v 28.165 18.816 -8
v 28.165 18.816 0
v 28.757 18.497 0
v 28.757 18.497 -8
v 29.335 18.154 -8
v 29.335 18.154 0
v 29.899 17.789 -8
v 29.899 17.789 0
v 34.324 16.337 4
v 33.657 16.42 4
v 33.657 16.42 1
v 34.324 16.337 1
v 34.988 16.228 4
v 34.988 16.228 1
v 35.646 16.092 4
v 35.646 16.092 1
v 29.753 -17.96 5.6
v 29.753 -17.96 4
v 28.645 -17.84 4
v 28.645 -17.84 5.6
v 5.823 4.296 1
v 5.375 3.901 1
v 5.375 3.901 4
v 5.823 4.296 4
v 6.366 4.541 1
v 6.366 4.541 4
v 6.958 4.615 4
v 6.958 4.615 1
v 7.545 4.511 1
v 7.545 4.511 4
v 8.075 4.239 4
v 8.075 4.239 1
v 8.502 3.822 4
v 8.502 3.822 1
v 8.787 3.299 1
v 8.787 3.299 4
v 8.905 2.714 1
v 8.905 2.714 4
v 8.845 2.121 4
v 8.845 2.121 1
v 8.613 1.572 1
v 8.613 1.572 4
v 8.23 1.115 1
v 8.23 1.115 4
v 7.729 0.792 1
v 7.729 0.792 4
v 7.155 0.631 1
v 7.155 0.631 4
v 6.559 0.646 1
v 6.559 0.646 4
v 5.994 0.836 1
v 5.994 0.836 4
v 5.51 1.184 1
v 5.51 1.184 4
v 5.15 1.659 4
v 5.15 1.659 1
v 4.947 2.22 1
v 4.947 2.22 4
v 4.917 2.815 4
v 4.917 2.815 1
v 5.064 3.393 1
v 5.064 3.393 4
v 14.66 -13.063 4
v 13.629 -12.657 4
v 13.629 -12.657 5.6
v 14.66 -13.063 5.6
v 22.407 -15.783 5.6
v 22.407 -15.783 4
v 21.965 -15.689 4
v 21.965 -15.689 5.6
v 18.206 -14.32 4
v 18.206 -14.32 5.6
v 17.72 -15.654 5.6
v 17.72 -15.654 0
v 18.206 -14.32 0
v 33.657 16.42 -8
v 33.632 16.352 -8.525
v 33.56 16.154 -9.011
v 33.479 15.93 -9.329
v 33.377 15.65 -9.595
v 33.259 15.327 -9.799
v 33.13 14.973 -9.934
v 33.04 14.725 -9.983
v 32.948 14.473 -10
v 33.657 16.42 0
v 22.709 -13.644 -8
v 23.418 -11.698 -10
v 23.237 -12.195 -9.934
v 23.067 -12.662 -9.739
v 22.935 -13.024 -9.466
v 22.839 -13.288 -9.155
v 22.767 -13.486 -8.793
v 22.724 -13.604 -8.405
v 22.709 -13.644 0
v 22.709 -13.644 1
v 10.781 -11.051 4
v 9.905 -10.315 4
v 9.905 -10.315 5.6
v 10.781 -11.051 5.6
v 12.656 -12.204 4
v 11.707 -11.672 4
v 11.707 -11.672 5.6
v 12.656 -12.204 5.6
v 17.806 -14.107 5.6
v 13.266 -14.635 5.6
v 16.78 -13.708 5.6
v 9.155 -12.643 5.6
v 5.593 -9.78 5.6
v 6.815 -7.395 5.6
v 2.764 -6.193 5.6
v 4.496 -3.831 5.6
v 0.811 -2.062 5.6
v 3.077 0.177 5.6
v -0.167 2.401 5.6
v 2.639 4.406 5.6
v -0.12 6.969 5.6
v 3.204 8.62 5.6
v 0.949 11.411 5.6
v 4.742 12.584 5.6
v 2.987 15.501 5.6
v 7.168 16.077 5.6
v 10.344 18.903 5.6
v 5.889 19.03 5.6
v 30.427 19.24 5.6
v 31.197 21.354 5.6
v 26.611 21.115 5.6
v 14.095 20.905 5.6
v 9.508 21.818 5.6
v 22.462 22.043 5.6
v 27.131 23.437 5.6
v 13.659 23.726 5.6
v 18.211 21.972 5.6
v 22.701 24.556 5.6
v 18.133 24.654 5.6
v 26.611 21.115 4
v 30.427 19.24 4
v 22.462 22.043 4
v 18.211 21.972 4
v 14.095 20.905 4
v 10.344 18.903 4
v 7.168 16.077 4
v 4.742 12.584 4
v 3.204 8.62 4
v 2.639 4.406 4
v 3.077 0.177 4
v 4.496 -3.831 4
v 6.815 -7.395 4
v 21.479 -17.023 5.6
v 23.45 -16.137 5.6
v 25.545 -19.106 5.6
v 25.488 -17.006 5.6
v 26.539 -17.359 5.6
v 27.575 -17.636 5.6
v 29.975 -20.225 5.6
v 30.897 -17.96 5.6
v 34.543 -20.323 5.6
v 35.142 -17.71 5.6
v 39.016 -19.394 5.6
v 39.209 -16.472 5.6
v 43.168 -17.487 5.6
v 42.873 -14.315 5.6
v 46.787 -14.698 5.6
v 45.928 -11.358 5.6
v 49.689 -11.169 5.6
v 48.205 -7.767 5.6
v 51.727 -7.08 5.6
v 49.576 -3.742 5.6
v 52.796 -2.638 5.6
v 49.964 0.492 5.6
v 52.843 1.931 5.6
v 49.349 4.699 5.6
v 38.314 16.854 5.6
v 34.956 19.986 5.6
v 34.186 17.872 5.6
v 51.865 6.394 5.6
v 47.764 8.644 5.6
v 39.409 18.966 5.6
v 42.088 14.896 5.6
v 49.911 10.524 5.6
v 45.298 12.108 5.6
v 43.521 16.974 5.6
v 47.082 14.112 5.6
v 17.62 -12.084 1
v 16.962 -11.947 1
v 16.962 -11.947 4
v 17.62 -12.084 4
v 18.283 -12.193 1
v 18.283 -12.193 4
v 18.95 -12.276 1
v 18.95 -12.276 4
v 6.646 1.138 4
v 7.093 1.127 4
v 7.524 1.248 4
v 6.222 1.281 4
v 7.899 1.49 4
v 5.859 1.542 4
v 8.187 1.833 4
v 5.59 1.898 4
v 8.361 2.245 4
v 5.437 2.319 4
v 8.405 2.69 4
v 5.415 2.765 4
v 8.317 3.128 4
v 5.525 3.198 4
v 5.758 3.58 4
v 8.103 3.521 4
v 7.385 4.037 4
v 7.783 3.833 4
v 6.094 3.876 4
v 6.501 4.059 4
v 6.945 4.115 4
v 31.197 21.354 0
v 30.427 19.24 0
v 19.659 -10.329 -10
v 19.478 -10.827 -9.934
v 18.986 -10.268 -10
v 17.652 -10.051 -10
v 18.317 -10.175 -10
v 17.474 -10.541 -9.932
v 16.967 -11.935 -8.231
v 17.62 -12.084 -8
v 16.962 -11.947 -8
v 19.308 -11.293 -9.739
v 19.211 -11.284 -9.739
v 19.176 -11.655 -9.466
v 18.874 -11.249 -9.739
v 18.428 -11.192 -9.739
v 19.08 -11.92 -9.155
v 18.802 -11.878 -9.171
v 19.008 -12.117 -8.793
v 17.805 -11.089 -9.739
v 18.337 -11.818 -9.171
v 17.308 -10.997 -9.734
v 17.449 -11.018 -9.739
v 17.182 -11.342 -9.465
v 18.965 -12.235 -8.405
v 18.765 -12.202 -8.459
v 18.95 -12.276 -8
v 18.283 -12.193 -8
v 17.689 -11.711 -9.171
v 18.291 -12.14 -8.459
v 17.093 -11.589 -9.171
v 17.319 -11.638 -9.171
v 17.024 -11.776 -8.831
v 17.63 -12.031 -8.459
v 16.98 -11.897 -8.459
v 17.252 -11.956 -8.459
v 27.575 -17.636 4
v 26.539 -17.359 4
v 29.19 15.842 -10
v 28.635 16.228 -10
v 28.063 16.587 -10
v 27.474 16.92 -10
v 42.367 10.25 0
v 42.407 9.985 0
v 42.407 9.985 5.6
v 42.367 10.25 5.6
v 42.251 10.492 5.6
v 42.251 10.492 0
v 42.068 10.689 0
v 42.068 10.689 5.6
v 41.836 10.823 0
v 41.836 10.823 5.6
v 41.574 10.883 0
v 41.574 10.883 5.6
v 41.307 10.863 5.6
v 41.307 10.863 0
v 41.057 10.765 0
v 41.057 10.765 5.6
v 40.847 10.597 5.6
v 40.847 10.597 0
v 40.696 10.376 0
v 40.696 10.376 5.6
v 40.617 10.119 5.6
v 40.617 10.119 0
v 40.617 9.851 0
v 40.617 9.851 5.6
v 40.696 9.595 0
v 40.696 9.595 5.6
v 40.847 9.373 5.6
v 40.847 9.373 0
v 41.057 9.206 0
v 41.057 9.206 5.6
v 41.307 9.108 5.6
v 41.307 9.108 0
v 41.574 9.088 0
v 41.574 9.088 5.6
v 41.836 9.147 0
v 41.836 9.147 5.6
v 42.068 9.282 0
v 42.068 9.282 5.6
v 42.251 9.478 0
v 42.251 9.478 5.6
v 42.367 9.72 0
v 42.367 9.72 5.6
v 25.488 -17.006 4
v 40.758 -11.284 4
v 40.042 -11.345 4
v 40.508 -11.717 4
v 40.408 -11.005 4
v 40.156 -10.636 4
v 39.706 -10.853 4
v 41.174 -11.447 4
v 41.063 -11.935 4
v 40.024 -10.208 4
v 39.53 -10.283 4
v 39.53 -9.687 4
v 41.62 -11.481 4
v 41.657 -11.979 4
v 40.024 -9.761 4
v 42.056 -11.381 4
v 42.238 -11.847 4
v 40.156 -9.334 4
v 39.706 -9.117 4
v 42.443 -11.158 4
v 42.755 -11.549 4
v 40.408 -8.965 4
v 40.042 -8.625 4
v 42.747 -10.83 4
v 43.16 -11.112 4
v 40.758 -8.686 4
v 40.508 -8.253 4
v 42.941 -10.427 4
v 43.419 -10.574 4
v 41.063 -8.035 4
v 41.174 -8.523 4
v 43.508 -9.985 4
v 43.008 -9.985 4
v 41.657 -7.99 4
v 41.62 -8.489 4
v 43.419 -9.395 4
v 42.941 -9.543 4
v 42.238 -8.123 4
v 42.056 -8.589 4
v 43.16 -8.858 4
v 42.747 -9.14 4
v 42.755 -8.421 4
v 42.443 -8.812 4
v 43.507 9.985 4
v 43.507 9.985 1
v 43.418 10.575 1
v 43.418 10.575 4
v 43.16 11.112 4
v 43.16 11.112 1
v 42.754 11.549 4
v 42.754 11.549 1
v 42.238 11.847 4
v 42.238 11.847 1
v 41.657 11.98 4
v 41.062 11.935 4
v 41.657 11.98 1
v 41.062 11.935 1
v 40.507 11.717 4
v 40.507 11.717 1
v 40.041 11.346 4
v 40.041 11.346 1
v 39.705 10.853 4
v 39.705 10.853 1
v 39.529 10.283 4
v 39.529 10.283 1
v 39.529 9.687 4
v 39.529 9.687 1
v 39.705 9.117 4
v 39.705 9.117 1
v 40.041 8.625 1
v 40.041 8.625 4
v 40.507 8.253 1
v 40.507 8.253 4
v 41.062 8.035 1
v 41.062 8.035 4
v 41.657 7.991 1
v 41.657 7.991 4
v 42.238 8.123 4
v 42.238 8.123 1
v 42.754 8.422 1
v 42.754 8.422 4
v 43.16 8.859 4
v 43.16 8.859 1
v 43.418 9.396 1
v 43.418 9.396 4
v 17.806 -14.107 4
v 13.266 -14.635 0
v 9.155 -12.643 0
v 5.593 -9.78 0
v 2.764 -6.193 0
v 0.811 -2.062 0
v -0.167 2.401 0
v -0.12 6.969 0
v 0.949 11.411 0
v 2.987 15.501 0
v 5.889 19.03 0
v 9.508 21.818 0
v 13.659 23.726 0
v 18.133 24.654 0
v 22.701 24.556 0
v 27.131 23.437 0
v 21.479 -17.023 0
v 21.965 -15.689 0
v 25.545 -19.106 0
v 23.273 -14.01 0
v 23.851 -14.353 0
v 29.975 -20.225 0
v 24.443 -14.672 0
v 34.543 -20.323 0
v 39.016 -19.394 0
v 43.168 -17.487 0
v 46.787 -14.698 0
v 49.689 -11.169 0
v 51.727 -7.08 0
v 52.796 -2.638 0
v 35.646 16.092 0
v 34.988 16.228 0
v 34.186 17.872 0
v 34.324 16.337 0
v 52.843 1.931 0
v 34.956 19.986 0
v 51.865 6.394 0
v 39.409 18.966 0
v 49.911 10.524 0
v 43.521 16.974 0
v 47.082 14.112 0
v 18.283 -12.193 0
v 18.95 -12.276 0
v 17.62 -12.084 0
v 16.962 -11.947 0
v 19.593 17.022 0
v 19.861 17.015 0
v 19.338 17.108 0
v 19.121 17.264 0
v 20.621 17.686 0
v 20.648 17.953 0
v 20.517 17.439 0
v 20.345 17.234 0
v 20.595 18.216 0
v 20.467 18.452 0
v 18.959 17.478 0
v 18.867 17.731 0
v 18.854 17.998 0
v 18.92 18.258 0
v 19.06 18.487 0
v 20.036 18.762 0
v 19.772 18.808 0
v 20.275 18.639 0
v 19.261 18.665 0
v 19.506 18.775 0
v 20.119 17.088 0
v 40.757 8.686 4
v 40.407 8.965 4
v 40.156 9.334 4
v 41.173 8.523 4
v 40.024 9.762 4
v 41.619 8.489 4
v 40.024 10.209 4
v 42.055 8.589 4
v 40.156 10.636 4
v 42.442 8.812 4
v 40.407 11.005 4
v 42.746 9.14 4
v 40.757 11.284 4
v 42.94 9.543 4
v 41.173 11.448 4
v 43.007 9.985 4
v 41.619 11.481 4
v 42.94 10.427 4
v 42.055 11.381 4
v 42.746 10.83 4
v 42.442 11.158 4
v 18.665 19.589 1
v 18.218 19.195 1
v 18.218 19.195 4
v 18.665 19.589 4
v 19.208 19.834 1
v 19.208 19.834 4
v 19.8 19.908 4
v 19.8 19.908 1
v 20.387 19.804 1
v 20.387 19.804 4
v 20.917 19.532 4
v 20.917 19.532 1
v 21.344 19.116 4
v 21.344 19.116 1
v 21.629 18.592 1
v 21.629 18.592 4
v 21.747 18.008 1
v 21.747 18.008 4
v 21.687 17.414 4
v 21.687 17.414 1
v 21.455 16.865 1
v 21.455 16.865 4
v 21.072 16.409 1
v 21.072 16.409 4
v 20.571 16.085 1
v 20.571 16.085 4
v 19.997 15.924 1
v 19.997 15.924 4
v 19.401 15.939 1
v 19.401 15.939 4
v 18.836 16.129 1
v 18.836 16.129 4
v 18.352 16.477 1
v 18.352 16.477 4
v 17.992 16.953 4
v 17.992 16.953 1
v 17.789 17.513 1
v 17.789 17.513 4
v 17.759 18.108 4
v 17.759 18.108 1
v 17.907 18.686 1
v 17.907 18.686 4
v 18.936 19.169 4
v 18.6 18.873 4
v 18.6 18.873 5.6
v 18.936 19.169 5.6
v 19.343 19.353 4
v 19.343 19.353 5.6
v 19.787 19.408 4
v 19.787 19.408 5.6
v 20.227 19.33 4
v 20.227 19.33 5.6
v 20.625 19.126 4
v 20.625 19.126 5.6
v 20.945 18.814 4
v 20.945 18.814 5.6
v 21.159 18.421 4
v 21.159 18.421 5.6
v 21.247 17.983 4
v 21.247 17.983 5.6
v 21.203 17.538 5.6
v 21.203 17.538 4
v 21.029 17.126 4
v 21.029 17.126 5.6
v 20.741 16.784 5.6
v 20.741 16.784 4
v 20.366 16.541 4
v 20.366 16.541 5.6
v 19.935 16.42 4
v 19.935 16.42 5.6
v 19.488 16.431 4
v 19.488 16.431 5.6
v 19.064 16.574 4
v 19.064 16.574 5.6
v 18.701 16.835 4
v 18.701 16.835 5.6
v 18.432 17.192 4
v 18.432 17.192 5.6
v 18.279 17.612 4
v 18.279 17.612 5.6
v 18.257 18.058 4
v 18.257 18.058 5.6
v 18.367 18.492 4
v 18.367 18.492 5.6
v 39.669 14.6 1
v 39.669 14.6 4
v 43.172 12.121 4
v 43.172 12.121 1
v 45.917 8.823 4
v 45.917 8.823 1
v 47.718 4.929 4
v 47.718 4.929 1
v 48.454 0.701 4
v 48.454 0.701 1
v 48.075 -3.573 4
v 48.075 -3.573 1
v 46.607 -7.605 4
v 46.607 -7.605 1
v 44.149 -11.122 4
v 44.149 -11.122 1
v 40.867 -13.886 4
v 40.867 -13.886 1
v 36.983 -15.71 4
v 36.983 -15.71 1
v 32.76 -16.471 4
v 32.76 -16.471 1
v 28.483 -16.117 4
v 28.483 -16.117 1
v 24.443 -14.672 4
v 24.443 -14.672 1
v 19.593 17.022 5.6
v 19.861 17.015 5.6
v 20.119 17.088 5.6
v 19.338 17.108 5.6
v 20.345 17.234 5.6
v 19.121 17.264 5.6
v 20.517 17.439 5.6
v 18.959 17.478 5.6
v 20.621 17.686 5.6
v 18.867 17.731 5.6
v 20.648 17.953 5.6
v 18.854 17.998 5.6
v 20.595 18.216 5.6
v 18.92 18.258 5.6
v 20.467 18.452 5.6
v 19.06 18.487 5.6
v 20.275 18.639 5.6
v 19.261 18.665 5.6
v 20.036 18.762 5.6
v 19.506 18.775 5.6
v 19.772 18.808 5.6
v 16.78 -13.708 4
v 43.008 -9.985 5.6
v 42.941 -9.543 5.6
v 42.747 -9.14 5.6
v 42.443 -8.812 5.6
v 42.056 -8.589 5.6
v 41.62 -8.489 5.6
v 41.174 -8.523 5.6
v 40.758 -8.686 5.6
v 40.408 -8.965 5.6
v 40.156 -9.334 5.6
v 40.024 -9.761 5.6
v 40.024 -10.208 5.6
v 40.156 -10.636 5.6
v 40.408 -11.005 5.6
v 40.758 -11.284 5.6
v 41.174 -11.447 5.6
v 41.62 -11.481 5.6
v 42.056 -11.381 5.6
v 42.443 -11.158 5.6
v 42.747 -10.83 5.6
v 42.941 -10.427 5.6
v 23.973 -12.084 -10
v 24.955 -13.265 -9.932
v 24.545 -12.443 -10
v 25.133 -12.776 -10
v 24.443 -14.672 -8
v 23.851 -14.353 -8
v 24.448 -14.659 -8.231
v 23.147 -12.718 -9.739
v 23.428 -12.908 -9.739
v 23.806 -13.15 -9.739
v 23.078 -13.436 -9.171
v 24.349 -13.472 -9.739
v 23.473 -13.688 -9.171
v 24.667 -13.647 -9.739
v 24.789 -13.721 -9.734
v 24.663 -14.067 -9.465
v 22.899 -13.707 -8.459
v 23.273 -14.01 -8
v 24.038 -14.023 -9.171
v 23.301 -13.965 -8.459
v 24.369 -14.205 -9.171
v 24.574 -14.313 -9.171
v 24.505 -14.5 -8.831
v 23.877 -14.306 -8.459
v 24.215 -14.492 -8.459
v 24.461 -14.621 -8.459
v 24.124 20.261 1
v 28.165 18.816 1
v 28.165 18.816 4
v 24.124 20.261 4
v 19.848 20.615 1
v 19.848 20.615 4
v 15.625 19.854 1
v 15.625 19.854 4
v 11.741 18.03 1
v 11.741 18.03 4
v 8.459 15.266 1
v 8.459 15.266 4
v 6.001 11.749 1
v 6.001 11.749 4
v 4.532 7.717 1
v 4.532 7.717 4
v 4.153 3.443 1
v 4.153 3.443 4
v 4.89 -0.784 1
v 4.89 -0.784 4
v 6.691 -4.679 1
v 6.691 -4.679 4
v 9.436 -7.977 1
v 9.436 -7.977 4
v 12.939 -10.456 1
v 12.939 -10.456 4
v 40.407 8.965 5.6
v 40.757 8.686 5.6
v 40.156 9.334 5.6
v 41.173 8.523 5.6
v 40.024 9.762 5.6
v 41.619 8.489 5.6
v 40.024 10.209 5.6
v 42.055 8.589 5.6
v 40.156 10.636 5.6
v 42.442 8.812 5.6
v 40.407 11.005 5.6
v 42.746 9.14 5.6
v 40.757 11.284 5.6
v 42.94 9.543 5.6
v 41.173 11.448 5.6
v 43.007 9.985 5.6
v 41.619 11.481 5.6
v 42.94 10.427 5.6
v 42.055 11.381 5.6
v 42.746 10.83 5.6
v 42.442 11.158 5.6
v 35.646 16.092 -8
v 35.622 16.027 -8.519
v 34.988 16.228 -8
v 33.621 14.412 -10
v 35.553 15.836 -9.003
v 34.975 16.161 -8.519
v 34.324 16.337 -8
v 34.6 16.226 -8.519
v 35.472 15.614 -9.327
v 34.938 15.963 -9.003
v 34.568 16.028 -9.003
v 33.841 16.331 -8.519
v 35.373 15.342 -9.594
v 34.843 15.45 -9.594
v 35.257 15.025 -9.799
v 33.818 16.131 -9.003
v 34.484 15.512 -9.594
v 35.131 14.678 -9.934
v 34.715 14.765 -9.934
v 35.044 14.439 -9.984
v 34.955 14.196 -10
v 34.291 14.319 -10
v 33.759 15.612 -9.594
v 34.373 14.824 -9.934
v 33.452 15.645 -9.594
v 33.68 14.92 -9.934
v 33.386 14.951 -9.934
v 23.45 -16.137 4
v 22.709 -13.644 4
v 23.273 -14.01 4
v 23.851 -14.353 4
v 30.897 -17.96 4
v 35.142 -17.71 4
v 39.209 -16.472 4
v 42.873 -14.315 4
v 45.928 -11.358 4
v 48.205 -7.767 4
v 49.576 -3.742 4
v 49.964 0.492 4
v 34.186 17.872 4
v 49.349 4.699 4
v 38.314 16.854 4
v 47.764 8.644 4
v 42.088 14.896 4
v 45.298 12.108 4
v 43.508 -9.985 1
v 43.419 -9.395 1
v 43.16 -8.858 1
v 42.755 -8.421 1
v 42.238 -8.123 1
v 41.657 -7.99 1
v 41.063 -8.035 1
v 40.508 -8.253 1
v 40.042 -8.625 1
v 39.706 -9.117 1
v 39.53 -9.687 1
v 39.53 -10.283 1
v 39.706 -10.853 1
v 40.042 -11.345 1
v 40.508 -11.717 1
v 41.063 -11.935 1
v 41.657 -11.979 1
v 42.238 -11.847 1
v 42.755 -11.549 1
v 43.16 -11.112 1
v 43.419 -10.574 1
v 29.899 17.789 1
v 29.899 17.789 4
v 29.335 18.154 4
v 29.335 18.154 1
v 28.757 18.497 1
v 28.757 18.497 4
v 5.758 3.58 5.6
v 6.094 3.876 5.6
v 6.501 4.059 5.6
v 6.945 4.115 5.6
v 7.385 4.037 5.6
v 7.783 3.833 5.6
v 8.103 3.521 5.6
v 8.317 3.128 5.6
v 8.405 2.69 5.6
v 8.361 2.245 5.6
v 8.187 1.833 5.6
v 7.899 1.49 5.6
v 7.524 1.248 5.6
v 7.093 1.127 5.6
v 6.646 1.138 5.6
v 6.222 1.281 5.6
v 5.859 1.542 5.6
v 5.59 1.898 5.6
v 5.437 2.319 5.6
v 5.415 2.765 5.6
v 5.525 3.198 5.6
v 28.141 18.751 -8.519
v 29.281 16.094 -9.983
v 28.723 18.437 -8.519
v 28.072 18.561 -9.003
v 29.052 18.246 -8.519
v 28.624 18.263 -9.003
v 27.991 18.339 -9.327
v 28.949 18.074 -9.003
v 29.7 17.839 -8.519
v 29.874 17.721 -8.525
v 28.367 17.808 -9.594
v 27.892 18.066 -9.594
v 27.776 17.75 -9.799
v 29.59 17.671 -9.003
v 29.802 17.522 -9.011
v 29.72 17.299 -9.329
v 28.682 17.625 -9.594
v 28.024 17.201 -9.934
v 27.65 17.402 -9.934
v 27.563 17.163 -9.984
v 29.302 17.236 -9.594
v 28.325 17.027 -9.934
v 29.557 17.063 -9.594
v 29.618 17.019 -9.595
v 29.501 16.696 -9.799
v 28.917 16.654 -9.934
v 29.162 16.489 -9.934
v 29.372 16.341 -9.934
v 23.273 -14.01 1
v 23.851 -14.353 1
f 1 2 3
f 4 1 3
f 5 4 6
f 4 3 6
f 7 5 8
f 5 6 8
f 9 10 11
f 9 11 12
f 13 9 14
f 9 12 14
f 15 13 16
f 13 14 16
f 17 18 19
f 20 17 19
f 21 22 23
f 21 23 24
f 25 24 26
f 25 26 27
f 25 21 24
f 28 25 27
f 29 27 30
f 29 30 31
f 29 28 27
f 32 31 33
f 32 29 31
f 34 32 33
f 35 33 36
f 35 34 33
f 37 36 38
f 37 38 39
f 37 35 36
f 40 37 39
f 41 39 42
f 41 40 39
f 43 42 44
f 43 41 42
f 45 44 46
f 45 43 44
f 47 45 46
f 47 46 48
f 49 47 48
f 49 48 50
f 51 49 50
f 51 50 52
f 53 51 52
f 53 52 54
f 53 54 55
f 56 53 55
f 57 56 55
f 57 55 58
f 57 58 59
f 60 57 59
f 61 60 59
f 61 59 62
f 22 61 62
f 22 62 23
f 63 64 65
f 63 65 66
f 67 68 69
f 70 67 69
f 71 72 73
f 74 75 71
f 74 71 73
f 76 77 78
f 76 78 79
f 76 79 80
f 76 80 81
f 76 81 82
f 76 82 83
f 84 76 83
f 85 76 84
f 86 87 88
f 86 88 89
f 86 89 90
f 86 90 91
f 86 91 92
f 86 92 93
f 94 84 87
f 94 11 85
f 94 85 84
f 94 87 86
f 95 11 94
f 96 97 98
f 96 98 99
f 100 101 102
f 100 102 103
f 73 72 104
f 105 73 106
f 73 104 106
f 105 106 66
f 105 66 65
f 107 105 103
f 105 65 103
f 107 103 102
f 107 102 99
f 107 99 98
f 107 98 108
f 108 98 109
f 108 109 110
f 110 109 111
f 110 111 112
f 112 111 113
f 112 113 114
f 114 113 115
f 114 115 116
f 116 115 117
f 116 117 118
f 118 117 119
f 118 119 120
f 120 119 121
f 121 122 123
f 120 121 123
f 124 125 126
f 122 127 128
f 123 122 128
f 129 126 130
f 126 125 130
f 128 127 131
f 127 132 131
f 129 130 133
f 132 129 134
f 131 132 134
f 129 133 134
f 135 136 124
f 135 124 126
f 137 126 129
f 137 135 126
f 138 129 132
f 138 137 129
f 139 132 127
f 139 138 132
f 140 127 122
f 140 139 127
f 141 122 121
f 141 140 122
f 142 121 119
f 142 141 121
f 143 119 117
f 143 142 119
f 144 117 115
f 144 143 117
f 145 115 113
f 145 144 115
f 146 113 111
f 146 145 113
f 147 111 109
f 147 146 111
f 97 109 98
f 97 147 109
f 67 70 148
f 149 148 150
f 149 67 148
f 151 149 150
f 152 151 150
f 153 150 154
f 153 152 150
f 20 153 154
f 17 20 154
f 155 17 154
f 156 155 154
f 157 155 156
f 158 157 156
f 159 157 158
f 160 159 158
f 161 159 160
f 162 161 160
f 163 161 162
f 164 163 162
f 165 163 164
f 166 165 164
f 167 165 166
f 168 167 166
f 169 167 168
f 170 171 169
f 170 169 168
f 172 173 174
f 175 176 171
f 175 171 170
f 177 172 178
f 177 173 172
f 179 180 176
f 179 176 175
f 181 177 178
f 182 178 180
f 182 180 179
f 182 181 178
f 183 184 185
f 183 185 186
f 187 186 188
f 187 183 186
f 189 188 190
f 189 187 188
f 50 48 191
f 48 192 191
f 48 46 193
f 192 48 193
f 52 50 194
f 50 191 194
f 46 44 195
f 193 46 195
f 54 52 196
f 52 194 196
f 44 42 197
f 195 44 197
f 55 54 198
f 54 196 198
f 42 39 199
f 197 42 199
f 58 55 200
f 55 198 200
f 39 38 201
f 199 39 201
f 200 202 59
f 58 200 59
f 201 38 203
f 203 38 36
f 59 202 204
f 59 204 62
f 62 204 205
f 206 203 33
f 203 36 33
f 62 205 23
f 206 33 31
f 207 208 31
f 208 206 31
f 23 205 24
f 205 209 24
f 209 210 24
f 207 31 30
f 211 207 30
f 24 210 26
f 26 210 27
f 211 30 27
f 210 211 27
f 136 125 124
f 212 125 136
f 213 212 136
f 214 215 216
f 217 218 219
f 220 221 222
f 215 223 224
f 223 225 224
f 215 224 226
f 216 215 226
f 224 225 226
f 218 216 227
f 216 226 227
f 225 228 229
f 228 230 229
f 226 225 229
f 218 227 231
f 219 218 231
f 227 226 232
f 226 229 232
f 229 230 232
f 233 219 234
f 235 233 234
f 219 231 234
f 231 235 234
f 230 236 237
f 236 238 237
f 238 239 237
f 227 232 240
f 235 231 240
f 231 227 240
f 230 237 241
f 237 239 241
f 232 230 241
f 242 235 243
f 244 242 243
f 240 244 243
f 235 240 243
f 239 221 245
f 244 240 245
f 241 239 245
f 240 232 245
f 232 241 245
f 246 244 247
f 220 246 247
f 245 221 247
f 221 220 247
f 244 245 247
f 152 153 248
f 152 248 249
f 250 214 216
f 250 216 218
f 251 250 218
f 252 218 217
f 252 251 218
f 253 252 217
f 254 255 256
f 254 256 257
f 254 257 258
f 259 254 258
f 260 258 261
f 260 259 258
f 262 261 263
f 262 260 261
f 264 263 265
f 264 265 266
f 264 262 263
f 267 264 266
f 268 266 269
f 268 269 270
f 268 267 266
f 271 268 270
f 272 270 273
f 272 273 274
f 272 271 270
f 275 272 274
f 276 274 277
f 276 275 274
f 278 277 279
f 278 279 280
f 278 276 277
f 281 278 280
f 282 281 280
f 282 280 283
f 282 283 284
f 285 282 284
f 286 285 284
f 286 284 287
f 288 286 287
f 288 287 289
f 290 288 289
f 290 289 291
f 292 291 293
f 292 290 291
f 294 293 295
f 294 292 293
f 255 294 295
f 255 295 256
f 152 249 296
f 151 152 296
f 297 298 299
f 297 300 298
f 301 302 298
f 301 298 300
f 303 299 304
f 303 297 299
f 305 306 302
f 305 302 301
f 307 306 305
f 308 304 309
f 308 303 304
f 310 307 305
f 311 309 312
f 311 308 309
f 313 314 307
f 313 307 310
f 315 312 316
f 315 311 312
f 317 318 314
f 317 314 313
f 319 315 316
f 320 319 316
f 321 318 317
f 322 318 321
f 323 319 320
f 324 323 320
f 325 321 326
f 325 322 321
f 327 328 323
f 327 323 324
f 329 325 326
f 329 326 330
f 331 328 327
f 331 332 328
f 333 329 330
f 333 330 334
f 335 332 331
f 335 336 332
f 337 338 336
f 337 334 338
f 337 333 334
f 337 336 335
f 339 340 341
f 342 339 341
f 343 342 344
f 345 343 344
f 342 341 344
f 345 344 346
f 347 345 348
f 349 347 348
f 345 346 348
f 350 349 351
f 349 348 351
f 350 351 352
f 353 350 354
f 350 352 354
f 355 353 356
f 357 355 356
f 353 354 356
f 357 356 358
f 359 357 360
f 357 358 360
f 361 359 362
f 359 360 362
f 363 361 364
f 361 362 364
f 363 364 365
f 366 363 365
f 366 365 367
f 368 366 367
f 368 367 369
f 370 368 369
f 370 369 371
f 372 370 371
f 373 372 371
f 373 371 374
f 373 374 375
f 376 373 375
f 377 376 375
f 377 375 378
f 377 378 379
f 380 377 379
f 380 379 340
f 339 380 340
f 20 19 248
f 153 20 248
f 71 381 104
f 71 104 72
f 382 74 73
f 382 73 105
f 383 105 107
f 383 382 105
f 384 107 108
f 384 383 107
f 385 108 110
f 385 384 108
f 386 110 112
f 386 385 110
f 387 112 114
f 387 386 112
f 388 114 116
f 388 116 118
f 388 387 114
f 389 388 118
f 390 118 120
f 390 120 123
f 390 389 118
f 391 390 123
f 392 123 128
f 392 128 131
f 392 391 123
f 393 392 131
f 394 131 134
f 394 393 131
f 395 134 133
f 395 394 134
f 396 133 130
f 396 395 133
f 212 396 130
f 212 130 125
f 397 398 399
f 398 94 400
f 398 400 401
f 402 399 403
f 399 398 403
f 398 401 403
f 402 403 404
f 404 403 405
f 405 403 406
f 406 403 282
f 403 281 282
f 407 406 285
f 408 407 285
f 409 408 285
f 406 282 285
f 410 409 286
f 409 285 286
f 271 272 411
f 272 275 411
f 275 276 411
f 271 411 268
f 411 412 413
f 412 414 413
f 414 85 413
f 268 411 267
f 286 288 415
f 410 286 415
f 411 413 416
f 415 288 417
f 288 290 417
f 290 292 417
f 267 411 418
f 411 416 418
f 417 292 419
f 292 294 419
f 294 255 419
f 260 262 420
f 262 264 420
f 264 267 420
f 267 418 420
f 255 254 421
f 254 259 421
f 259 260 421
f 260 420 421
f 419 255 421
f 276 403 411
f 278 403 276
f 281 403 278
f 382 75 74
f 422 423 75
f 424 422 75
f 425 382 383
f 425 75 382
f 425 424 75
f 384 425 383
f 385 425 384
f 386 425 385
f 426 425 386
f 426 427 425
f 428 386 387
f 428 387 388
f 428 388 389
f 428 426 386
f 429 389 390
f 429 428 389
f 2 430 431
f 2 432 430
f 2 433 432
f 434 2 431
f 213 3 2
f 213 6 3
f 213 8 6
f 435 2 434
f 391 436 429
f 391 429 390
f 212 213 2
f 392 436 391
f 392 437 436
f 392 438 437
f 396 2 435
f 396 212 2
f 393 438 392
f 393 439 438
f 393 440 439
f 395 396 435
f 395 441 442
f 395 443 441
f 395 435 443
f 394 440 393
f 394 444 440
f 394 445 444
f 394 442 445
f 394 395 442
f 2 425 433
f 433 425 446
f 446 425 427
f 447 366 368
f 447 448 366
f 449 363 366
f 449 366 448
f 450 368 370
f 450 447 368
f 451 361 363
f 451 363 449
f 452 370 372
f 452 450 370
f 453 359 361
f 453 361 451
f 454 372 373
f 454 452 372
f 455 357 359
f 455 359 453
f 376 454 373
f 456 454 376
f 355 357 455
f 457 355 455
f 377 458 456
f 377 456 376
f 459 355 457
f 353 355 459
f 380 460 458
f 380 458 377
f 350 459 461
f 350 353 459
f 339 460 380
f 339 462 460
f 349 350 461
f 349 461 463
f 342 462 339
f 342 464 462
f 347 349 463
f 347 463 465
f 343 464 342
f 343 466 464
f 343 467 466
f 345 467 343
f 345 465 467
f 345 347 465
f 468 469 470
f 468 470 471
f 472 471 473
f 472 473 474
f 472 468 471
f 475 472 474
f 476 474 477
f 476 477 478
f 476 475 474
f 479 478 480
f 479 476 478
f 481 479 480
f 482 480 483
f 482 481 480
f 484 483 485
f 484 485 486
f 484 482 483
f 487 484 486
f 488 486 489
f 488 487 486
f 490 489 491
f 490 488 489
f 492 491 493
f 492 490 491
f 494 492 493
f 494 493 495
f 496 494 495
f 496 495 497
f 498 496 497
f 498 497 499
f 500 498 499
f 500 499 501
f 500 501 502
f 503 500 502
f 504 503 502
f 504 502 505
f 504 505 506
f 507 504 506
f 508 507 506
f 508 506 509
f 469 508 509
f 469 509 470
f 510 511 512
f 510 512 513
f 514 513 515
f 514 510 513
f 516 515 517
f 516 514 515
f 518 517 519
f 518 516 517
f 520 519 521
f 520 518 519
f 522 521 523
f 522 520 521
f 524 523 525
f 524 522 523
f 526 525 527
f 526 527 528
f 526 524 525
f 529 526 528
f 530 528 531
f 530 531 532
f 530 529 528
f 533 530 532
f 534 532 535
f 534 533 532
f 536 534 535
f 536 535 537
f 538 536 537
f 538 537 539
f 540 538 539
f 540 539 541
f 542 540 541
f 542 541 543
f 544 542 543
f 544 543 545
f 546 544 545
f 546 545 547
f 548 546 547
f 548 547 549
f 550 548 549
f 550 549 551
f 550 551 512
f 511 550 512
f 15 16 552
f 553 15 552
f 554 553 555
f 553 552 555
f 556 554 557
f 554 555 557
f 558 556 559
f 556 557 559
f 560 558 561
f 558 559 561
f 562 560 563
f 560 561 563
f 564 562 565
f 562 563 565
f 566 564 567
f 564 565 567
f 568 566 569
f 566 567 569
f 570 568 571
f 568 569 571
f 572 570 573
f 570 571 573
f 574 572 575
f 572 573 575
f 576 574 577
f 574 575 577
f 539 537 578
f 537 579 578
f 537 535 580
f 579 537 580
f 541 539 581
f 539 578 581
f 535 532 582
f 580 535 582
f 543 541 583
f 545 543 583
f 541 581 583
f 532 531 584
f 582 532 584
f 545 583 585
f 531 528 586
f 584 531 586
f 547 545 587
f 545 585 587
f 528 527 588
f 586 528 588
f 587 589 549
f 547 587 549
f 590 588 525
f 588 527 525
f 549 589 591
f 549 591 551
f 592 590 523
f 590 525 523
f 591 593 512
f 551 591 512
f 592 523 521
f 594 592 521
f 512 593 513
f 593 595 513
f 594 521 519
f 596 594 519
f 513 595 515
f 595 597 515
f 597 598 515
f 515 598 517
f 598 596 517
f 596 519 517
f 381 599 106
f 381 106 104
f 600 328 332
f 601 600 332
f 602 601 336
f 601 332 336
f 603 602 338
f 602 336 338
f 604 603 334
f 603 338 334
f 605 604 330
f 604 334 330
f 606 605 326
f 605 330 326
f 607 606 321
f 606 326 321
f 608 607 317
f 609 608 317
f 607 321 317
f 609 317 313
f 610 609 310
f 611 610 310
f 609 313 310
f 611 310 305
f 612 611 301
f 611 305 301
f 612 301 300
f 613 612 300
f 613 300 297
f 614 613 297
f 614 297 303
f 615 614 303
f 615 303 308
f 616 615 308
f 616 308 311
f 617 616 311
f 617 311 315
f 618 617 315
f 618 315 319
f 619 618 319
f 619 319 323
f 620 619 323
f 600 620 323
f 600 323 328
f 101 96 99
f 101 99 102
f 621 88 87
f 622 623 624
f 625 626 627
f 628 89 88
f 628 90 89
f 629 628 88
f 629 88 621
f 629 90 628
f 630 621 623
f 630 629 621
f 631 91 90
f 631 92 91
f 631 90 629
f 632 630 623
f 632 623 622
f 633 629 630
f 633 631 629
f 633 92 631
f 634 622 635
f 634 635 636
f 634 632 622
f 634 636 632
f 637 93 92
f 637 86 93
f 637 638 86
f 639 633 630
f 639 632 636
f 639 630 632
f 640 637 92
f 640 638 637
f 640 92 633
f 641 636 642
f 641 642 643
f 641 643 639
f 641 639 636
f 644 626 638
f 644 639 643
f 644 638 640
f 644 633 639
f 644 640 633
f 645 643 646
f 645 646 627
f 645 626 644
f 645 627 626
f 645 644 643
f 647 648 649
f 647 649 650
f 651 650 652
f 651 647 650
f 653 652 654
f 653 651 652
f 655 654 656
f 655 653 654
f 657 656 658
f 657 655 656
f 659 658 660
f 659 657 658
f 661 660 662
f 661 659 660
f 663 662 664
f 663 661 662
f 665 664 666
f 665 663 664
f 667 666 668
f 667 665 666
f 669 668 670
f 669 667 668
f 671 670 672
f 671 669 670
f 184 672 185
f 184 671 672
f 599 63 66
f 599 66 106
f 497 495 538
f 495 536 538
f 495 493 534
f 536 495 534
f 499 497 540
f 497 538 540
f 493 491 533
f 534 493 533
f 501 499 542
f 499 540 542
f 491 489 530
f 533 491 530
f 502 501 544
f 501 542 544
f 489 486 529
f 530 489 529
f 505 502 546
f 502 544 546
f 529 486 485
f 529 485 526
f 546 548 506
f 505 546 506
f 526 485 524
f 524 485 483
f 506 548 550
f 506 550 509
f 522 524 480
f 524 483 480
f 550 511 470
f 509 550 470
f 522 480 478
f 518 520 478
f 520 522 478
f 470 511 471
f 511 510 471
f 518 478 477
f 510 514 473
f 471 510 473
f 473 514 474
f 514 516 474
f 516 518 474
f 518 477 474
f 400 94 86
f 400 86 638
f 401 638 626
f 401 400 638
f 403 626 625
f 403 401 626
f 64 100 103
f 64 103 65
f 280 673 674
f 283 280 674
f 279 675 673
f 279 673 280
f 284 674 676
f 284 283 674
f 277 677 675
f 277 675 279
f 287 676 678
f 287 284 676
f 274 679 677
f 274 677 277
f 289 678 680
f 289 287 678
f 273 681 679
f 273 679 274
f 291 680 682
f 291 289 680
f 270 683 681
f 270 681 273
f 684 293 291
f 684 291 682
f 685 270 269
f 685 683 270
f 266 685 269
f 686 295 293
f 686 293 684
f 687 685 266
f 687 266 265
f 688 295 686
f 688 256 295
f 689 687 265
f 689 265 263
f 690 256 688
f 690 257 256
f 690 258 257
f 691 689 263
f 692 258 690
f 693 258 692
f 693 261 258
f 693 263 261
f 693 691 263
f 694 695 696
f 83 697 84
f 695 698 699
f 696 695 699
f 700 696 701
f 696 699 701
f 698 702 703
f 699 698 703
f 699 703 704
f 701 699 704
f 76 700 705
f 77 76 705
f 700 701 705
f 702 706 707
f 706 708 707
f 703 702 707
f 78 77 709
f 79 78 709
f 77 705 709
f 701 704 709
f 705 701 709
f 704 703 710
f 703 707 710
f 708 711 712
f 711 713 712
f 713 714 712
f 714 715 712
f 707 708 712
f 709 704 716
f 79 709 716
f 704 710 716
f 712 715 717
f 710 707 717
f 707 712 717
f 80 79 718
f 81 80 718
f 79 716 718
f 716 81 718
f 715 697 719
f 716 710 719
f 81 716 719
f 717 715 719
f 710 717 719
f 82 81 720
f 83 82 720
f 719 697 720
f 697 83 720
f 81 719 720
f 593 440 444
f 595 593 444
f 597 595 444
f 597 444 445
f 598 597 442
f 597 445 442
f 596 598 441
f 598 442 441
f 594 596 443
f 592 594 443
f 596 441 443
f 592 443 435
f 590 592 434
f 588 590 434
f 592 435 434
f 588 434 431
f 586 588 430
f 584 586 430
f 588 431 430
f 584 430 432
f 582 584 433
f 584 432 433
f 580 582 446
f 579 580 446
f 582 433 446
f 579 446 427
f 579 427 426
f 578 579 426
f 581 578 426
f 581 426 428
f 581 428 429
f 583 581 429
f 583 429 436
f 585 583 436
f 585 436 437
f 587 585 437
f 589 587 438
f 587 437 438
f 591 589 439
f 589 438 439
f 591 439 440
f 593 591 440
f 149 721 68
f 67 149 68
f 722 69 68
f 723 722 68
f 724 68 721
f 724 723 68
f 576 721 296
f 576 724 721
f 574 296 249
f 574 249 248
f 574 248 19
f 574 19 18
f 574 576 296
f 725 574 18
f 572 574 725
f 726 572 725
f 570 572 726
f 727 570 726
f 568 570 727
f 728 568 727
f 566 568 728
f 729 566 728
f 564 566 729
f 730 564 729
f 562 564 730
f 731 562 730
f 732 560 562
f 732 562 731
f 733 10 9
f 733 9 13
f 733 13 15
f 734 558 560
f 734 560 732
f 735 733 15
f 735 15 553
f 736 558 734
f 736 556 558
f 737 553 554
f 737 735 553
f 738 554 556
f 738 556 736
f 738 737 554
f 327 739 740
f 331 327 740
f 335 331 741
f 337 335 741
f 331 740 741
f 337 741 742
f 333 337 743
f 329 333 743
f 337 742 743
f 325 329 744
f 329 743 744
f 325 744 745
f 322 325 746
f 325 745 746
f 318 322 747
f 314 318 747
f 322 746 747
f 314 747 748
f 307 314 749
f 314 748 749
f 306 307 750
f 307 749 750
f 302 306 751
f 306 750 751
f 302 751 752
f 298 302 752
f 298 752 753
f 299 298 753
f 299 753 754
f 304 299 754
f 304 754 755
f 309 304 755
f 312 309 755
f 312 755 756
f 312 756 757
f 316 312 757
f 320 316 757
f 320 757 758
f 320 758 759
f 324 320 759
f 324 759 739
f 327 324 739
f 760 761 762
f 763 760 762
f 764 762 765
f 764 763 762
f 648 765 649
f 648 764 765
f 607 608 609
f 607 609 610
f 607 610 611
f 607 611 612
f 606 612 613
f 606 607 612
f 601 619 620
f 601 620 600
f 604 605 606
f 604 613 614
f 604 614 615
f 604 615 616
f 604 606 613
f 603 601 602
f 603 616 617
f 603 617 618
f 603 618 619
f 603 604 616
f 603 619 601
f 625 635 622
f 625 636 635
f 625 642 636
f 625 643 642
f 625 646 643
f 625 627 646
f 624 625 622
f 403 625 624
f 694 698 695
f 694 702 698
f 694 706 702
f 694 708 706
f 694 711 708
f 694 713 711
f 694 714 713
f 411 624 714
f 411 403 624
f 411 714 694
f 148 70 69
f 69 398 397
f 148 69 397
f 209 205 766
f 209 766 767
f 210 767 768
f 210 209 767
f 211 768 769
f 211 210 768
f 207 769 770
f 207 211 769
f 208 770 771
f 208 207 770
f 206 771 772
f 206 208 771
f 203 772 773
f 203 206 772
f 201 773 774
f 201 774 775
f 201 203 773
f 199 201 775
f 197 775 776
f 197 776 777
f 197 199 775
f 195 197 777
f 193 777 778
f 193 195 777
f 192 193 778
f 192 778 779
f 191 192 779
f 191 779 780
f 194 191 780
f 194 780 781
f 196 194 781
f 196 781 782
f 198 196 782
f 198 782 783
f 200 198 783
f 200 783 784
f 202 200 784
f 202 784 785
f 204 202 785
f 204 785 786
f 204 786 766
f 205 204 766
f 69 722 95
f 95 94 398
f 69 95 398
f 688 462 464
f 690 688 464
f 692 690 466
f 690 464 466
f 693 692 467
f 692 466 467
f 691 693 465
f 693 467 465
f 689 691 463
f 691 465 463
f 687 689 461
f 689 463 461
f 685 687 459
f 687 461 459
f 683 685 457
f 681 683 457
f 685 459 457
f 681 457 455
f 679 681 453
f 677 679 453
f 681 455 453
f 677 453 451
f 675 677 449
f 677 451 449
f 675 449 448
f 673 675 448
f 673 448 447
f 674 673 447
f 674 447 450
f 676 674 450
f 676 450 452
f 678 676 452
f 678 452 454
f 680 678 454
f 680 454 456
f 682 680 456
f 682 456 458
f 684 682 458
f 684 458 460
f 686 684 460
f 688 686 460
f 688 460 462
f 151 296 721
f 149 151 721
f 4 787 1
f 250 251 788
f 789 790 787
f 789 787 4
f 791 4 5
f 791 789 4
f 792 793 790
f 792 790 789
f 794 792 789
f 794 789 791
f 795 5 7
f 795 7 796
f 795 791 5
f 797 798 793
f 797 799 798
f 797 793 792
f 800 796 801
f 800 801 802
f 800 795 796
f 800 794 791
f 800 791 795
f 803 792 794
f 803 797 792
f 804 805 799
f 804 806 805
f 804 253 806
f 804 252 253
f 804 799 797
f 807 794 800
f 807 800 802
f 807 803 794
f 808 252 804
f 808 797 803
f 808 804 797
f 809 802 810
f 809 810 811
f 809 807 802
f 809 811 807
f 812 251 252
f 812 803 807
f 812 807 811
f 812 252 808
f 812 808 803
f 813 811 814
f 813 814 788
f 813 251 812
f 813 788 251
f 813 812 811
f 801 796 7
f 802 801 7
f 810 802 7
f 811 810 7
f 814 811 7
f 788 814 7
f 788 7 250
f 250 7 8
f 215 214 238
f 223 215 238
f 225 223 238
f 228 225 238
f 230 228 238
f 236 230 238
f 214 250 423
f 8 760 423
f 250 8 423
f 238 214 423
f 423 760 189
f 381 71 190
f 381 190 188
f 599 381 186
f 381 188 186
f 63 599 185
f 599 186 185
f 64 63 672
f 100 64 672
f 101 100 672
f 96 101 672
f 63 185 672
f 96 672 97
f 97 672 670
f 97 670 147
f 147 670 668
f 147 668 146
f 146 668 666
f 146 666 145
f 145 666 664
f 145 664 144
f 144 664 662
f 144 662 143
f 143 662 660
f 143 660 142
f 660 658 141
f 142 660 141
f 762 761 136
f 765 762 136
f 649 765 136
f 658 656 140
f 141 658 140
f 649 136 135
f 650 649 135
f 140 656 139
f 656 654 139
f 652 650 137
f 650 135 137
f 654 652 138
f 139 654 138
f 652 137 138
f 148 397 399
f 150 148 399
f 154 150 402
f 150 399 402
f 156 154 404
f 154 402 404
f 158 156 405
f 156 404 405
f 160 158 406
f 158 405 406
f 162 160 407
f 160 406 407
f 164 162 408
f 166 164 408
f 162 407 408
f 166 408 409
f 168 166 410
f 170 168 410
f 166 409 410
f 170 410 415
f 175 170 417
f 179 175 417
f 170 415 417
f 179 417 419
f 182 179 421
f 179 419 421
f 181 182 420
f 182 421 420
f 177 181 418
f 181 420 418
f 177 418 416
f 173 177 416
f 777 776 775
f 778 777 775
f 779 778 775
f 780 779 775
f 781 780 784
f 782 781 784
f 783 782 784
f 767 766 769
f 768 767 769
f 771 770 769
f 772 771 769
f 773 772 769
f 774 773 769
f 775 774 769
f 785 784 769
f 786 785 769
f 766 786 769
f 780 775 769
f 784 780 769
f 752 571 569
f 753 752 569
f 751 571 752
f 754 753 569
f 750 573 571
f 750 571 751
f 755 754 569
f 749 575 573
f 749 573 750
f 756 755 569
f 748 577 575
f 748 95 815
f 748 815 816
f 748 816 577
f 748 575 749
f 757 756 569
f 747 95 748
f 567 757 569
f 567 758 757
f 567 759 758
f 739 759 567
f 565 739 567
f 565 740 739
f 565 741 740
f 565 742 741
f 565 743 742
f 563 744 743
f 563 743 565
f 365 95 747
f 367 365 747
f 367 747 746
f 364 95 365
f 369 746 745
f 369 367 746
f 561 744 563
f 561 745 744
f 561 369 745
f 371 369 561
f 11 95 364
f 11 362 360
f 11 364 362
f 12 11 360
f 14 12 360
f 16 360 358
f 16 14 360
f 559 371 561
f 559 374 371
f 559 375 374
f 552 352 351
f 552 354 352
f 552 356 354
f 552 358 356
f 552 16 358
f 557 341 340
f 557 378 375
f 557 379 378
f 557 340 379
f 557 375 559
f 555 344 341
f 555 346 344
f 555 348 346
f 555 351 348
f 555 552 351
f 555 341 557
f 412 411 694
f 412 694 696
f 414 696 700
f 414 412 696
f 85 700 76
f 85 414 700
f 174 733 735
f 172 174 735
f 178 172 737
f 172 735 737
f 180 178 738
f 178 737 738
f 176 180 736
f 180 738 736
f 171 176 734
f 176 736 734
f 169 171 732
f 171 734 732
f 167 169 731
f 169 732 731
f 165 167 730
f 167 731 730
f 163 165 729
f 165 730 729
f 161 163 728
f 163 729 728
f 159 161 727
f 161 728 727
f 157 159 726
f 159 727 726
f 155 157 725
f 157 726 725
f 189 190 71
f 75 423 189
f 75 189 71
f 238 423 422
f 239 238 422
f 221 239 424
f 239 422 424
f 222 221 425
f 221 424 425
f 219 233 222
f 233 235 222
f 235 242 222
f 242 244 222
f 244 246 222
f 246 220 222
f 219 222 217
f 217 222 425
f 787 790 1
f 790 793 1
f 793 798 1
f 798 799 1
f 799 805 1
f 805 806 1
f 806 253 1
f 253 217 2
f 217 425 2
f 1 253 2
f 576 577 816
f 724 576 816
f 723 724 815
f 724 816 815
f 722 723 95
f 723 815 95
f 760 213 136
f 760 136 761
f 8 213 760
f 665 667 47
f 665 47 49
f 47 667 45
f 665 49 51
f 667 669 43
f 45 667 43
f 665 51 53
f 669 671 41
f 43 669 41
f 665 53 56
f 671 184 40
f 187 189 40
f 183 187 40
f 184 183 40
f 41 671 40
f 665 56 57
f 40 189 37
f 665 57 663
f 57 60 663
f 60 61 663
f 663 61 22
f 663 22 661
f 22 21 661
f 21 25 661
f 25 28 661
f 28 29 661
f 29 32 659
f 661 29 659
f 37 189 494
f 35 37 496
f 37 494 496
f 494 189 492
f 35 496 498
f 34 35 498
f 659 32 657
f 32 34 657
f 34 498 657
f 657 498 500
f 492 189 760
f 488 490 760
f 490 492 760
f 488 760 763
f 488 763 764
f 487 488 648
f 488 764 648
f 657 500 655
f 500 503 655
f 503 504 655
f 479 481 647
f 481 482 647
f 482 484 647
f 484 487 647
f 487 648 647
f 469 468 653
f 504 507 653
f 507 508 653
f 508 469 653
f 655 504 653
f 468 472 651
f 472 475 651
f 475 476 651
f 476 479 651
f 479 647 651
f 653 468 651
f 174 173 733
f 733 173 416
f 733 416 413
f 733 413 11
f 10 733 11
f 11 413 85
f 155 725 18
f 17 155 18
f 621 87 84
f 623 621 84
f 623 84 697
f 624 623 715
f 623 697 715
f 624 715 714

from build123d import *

# Parameters (mm, degrees)
F3_R     = 2
F4_DEPTH = 1
F3_R_2   = 1.5
F5_DEPTH = 4
F3_R_3   = 0.9
F6_DEPTH = 5.6
F7_DEPTH = 10
F8_R     = 2


# Not quite as in the source:
# - a feature names something its author has since deleted; it is built from what else it names


with BuildPart() as f4:
    # F3 (on Top) → F4 (new body)
    with BuildSketch(Plane.XY):
        with BuildLine():
            ThreePointArc((24.4428970275, -14.671741632), (47.4729130652, -5.6368234206), (35.645763749, 16.0917274937))
            Line((35.645763749, 16.0917274937), (24.4428970275, -14.671741632))
        make_face()
        with Locations((41.5076157406, -9.9849013437)):
            Circle(F3_R, mode=Mode.SUBTRACT)
        with Locations((41.5070735985, 9.9851724147)):
            Circle(F3_R, mode=Mode.SUBTRACT)
        with BuildLine():
            ThreePointArc((35.645763749, 16.0917274937), (34.656487532, 16.286160575), (33.6571820844, 16.4198029295))
            Line((33.6571820844, 16.4198029295), (22.7090189654, -13.6442410753))
            ThreePointArc((22.7090189654, -13.6442410753), (23.5602527059, -14.1844935862), (24.4428970275, -14.671741632))
            Line((24.4428970275, -14.671741632), (35.645763749, 16.0917274937))
        make_face()
    extrude(amount=F4_DEPTH)

    # F3 (on Top) → F5 (join)
    with BuildSketch(Plane.XY):
        with BuildLine():
            Line((29.7526022679, -17.9595595539), (30.8971311949, -17.9595595539))
            ThreePointArc((30.8971311949, -17.9595595539), (49.8956420488, -1.6368218512), (34.185866977, 17.871590385))
            Line((34.185866977, 17.871590385), (33.6571820844, 16.4198029295))
            ThreePointArc((33.6571820844, 16.4198029295), (34.656487532, 16.286160575), (35.645763749, 16.0917274937))
            ThreePointArc((35.645763749, 16.0917274937), (47.4729130652, -5.6368234206), (24.4428970275, -14.671741632))
            ThreePointArc((24.4428970275, -14.671741632), (23.5602527059, -14.1844935862), (22.7090189654, -13.6442410753))
            Line((22.7090189654, -13.6442410753), (21.9645680543, -15.6885296658))
            Line((21.9645680543, -15.6885296658), (22.4073752761, -15.7830882818))
            Line((22.4073752761, -15.7830882818), (23.4502572566, -16.1368325353))
            Line((23.4502572566, -16.1368325353), (25.4884753376, -17.0060619712))
            Line((25.4884753376, -17.0060619712), (26.5388786793, -17.3585340381))
            Line((26.5388786793, -17.3585340381), (27.5754574686, -17.6364984363))
            Line((27.5754574686, -17.6364984363), (28.6447145045, -17.8397707641))
            Line((28.6447145045, -17.8397707641), (29.7526022679, -17.9595595539))
        make_face()
        with Locations((41.5076157406, -9.9849013437)):
            Circle(F3_R)
        with Locations((41.5076157406, -9.9849013437)):
            Circle(F3_R_2, mode=Mode.SUBTRACT)
        with Locations((41.5070735985, 9.9851724147)):
            Circle(F3_R)
        with Locations((41.5070735985, 9.9851724147)):
            Circle(F3_R_2, mode=Mode.SUBTRACT)
    extrude(amount=F5_DEPTH)

    # F3 (on Top) → F6 (join)
    with BuildSketch(Plane.XY):
        with BuildLine():
            ThreePointArc((34.185866977, 17.871590385), (49.8956420488, -1.6368218512), (30.8971311949, -17.9595595539))
            Line((30.8971311949, -17.9595595539), (29.7526022679, -17.9595595539))
            Line((29.7526022679, -17.9595595539), (28.6447145045, -17.8397707641))
            Line((28.6447145045, -17.8397707641), (27.5754574686, -17.6364984363))
            Line((27.5754574686, -17.6364984363), (26.5388786793, -17.3585340381))
            Line((26.5388786793, -17.3585340381), (25.4884753376, -17.0060619712))
            Line((25.4884753376, -17.0060619712), (23.4502572566, -16.1368325353))
            Line((23.4502572566, -16.1368325353), (22.4073752761, -15.7830882818))
            Line((22.4073752761, -15.7830882818), (21.9645680543, -15.6885296658))
            Line((21.9645680543, -15.6885296658), (21.4785924091, -17.0230360138))
            ThreePointArc((21.4785924091, -17.0230360138), (51.7265670481, -7.0799100929), (34.9557263509, 19.985651515))
            Line((34.9557263509, 19.985651515), (34.185866977, 17.871590385))
        make_face()
        with Locations((41.5076157406, -9.9849013437)):
            Circle(F3_R_2)
        with Locations((41.5070735985, 9.9851724147)):
            Circle(F3_R_2)
        with Locations((41.5070735985, 9.9851724147)):
            Circle(F3_R_3, mode=Mode.SUBTRACT)
    extrude(amount=F6_DEPTH)

    # F3 (on Top) → F7 (join)
    with BuildSketch(Plane.XY):
        with BuildLine():
            ThreePointArc((35.645763749, 16.0917274937), (34.656487532, 16.286160575), (33.6571820844, 16.4198029295))
            Line((33.6571820844, 16.4198029295), (22.7090189654, -13.6442410753))
            ThreePointArc((22.7090189654, -13.6442410753), (23.5602527059, -14.1844935862), (24.4428970275, -14.671741632))
            Line((24.4428970275, -14.671741632), (35.645763749, 16.0917274937))
        make_face()
    extrude(amount=-F7_DEPTH)

    # F8
    f8_edges = [f4.edges().sort_by_distance(p)[0] for p in [
        (23.560253, -14.184494, -10),
        (34.656488, 16.286161, -10),
    ]]
    fillet(f8_edges, radius=F8_R)


with BuildPart() as f10_1:
    # F10: instance of F4
    add(f4.part.mirror(Plane(origin=(26.3392995557, 2.1695369703, -3.8368049067), x_dir=(-0.3421787181, -0.9396348891, 0), z_dir=(-0.9396348891, 0.3421787181, 0))))


solid = Compound([f4.part, f10_1.part])
